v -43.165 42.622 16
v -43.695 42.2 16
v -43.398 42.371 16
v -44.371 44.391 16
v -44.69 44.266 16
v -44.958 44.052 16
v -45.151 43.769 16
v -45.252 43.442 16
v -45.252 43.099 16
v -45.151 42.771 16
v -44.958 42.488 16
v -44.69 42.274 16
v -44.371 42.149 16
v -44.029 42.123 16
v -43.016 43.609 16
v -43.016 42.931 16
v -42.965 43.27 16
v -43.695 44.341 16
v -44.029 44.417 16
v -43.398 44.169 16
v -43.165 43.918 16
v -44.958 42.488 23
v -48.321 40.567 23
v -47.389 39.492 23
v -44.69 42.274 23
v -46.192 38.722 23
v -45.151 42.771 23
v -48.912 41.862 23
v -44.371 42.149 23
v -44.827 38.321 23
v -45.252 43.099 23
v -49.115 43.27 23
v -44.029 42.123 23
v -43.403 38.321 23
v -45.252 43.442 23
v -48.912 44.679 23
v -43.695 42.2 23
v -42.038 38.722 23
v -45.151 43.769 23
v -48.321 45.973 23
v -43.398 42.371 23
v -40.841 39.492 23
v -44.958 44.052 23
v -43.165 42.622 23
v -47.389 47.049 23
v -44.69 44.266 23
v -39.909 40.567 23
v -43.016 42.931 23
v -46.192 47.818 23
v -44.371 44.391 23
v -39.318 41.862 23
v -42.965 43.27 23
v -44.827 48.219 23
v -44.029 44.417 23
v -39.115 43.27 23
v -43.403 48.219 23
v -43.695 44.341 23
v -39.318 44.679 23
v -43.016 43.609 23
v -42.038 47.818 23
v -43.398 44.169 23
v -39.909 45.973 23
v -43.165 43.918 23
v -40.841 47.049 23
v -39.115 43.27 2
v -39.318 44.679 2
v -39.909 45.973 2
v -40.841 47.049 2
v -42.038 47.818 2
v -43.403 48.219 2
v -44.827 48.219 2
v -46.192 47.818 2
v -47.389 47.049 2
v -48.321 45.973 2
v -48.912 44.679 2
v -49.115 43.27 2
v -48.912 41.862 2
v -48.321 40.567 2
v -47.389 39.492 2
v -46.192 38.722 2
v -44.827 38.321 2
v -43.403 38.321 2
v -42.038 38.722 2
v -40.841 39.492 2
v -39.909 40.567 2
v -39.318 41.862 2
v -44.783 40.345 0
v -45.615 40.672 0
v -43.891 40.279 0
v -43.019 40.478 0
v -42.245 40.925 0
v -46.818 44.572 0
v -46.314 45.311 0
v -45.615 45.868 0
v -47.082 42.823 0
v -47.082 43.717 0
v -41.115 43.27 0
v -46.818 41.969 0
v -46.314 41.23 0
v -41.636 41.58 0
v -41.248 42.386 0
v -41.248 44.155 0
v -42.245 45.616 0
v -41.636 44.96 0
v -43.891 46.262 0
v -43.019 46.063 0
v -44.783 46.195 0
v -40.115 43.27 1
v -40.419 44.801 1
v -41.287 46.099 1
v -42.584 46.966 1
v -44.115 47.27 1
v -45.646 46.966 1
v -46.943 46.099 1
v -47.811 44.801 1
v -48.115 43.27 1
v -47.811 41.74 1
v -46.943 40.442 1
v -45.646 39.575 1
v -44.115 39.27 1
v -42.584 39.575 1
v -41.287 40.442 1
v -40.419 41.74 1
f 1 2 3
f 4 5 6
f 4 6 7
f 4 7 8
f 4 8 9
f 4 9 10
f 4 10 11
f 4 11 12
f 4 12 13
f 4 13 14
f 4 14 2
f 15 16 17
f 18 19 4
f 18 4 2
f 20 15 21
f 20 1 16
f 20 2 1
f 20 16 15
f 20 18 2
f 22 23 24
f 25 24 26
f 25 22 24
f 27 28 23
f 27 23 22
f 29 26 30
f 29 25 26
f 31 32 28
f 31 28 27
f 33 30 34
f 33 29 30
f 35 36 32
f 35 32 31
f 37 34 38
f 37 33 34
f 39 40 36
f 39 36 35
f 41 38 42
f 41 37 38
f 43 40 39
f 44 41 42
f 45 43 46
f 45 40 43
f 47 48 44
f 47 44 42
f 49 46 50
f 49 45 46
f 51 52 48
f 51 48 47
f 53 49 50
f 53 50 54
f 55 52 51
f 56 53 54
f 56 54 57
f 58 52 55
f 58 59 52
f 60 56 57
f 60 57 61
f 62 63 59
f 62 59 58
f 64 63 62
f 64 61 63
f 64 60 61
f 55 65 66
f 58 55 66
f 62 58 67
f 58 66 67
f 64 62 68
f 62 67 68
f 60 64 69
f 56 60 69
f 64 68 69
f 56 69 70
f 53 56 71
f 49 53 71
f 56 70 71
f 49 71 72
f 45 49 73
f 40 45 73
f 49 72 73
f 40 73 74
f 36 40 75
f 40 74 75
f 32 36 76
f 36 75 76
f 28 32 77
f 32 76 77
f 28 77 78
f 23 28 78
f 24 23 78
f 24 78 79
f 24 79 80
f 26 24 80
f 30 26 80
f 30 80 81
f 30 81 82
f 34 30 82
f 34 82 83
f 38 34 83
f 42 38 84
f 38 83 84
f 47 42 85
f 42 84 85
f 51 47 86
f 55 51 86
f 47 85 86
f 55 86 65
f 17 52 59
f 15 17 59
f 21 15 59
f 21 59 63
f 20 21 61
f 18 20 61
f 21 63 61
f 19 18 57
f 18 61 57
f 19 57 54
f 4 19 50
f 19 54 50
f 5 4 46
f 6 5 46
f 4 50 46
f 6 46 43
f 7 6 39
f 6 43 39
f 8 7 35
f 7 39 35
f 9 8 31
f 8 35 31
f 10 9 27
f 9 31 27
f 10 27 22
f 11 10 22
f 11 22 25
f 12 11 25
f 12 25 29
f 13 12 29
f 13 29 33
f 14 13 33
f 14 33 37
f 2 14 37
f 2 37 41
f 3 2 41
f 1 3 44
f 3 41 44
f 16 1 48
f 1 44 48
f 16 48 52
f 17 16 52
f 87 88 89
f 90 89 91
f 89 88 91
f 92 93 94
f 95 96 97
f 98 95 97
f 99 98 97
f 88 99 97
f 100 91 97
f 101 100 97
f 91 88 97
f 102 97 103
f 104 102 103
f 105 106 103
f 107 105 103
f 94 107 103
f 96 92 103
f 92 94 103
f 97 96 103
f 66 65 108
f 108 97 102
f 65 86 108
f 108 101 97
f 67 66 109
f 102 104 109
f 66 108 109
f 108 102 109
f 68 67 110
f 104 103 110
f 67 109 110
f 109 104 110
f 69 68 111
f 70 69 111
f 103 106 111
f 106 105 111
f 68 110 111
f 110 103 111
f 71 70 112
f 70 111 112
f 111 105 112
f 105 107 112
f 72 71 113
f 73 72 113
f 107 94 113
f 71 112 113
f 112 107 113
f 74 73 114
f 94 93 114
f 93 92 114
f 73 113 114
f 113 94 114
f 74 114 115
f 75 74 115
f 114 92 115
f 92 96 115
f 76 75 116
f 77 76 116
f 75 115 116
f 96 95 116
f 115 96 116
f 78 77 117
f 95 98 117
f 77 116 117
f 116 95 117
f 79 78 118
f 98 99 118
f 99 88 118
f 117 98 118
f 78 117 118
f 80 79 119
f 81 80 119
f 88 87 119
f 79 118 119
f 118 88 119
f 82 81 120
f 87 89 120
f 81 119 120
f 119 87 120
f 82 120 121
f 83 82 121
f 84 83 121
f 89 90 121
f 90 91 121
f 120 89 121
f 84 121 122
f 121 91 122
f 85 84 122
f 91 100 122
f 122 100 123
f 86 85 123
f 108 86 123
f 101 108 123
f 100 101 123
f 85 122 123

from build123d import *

# Parameters (mm, degrees)
F0_R     = 5
F0_R_2   = 2.5
F1_DEPTH = 23
F2_R     = 1.15
F3_DEPTH = 7
F4_SIZE  = 2


with BuildPart() as f1:
    # F0 (on Top) → F1 (new body)
    with BuildSketch(Plane.XY):
        with Locations((-44.115018, 43.270264)):
            Circle(F0_R)
        with Locations((-44.115018, 43.270264)):
            Circle(F0_R_2, mode=Mode.SUBTRACT)
        with Locations((-44.115018, 43.270264)):
            Circle(F0_R_2)
    extrude(amount=F1_DEPTH)

    # F2 (on face) → F3 (cut)
    with BuildSketch(Plane.XY.offset(23)):
        with Locations((-44.115018, 43.270264)):
            Circle(F2_R)
    extrude(amount=-F3_DEPTH, mode=Mode.SUBTRACT)

    # F4
    f4_edges = [f1.edges().sort_by_distance(p)[0] for p in [
        (-49.115018, 43.270264, 0),
    ]]
    chamfer(f4_edges, length=F4_SIZE)


solid = f1.part
